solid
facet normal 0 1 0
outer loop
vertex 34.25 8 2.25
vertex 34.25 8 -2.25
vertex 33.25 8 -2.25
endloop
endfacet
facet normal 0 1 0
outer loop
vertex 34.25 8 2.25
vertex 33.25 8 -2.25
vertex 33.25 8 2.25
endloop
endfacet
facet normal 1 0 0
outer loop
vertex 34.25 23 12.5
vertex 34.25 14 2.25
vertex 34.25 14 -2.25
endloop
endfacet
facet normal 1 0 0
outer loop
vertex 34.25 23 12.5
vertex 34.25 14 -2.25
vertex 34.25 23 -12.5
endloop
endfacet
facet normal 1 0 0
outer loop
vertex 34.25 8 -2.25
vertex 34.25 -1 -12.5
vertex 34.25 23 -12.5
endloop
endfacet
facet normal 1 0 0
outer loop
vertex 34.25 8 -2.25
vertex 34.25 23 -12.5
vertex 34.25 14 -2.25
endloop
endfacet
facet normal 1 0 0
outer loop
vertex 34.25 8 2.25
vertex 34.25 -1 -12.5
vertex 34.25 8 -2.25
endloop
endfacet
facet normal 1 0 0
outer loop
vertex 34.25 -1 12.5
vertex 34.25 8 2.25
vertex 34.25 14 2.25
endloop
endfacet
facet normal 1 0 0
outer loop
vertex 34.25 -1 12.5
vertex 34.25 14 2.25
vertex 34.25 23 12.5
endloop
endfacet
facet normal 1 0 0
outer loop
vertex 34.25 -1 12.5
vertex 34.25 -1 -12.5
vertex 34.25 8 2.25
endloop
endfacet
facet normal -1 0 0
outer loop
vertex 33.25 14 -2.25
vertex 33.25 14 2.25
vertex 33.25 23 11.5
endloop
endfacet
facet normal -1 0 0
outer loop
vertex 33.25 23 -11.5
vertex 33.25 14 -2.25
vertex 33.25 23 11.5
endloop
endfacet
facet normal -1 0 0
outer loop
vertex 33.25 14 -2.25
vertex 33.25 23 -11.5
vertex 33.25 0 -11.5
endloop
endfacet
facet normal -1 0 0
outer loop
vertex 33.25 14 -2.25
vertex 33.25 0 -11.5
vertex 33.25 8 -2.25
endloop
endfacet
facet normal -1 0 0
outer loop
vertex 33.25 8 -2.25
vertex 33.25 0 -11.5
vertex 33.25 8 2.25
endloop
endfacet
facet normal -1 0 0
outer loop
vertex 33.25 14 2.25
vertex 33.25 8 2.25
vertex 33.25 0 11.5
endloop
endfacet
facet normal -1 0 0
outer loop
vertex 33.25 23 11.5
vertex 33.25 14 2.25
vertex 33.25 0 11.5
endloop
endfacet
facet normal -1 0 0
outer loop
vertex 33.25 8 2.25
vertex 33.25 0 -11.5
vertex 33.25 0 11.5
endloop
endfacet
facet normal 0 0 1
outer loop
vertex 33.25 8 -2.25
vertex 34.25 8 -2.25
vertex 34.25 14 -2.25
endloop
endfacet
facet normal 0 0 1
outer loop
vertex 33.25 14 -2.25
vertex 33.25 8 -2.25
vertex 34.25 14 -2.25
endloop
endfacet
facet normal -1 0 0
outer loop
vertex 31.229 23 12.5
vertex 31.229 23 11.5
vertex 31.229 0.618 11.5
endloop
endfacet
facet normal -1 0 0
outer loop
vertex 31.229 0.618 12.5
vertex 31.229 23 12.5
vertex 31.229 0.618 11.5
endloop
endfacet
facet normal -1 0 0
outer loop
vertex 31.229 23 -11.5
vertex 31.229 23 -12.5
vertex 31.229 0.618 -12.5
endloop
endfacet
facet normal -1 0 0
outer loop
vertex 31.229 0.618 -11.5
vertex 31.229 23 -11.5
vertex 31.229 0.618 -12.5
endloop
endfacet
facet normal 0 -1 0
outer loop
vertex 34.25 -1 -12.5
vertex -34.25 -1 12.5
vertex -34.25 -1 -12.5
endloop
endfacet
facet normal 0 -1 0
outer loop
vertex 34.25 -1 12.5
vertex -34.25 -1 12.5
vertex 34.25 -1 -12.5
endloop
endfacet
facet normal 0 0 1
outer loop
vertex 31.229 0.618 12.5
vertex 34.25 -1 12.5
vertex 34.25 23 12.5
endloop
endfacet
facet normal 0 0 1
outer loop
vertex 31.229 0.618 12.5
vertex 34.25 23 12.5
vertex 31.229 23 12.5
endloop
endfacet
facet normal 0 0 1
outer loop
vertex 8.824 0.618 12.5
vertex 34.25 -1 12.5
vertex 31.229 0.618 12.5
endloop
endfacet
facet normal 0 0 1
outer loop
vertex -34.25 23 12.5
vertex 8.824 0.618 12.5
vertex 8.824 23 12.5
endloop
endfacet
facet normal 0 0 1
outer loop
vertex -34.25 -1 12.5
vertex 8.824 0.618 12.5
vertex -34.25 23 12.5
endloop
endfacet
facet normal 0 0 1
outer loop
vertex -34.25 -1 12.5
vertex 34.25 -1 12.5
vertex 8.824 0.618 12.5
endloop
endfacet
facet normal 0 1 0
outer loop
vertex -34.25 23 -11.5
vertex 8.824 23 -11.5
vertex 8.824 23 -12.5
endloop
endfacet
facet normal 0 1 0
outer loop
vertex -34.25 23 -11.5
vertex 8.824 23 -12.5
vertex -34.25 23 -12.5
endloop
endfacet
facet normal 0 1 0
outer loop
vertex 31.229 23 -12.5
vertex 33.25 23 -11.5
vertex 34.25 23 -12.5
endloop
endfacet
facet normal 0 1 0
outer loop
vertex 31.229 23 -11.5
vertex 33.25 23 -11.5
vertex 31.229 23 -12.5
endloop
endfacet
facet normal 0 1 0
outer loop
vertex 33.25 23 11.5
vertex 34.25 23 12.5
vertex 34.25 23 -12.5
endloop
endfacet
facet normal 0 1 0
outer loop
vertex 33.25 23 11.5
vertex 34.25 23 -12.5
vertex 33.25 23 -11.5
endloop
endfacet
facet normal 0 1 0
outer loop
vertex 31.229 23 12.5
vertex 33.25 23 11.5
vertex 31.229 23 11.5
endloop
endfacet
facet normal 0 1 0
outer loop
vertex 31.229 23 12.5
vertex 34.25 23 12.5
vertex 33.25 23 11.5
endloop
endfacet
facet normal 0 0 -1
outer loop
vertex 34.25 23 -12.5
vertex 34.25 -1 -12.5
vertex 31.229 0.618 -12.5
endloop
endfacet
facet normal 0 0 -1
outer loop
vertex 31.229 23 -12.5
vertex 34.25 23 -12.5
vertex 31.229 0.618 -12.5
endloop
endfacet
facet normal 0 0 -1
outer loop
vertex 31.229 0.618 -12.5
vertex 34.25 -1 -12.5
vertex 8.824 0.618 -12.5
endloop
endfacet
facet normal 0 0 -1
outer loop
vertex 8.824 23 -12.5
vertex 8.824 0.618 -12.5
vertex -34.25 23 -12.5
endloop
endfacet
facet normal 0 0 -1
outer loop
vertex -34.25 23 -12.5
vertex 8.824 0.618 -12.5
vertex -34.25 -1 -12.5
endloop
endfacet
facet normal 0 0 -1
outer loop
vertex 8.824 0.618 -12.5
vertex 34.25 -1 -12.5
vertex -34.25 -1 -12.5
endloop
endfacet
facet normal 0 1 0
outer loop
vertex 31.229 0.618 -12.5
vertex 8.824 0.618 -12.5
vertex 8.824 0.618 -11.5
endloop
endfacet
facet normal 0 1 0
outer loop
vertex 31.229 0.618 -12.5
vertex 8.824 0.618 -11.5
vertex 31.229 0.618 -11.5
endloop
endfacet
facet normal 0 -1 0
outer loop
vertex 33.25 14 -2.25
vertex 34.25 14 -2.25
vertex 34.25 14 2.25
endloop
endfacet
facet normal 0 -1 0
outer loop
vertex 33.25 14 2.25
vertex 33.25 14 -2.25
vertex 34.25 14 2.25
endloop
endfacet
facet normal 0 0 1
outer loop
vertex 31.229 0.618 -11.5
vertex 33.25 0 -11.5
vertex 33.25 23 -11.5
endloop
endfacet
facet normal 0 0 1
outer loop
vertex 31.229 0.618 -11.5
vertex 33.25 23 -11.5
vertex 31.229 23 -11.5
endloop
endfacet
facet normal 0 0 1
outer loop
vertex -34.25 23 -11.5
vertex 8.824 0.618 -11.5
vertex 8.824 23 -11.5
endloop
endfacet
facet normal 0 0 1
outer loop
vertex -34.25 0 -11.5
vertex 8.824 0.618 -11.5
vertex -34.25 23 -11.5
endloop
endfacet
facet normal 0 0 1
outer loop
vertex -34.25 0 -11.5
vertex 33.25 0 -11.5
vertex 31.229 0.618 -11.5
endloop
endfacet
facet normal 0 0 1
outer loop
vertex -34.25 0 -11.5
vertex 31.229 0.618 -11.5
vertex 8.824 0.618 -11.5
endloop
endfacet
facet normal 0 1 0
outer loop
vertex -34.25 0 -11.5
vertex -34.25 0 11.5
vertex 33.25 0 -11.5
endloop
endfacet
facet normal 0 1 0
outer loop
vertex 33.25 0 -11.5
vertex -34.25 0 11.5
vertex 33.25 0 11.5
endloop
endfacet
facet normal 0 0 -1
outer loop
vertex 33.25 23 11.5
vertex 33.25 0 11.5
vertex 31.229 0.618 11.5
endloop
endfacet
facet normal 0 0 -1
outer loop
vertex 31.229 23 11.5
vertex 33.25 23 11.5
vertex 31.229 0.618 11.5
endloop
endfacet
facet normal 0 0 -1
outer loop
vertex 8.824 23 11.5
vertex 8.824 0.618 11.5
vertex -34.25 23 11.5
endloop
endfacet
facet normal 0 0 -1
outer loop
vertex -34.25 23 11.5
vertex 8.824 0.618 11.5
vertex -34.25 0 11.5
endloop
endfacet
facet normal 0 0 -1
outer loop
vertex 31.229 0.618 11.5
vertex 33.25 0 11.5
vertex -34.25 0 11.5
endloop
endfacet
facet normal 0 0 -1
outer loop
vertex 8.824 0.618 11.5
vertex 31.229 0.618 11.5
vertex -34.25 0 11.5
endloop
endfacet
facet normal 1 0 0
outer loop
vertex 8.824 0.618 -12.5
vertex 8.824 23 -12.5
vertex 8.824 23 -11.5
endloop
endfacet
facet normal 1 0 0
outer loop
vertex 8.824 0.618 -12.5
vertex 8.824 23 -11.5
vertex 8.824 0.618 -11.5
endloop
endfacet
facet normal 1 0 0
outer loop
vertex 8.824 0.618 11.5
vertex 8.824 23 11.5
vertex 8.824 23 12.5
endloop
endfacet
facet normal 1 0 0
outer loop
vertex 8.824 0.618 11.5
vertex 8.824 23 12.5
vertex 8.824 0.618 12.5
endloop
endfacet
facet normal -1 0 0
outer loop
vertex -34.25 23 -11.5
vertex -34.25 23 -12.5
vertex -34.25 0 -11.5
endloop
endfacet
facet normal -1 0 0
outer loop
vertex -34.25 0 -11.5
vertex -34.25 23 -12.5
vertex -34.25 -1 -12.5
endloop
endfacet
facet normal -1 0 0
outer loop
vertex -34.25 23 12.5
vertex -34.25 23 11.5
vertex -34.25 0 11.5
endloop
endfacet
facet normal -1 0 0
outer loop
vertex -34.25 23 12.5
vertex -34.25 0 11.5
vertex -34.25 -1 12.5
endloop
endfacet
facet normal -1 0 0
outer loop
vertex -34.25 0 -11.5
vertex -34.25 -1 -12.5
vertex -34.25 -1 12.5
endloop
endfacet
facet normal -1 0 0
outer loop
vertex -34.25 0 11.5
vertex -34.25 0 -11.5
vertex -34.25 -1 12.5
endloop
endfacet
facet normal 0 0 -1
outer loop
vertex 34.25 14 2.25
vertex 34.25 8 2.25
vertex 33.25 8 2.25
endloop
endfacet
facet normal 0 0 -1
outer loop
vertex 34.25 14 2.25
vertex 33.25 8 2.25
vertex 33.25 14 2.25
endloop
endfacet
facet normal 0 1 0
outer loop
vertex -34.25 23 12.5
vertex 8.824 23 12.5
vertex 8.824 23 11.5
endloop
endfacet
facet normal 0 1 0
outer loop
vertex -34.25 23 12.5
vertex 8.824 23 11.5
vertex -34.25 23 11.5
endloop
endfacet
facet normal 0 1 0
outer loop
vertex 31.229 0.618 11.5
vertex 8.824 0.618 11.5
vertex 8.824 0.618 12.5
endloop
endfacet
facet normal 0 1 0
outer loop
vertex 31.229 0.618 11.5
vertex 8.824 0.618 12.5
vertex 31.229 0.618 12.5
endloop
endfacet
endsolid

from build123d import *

# Parameters (mm, degrees)
F0_W      = 68.5
F0_H      = 25
F1_DEPTH  = 1
F2_W      = 68.5
F2_H      = 1
F3_DEPTH  = 23
F4_W      = 1
F4_H      = 24
F5_DEPTH  = 23
F6_W      = 67.5
F6_H      = 1
F7_DEPTH  = 23
F8_W      = 6
F8_H      = 4.5
F9_DEPTH  = 1
F10_W     = 22.405751
F10_H     = 22.382014
F11_DEPTH = 25


with BuildPart() as f1:
    # F0 (on Front) → F1 (new body)
    with BuildSketch(Plane.XZ):
        Rectangle(F0_W, F0_H)
    extrude(amount=F1_DEPTH)

    # F2 (on face) → F3 (join)
    with BuildSketch(Plane(origin=(0, 0, 0), x_dir=(-1, 0, 0), z_dir=(0, 1, 0))):
        with Locations((0, -12)):
            Rectangle(F2_W, F2_H)
    extrude(amount=F3_DEPTH)

    # F4 (on face) → F5 (join)
    with BuildSketch(Plane(origin=(0, 0, 0), x_dir=(-1, 0, 0), z_dir=(0, 1, 0))):
        with Locations((-33.75, 0.5)):
            Rectangle(F4_W, F4_H)
    extrude(amount=F5_DEPTH)

    # F6 (on face) → F7 (join)
    with BuildSketch(Plane(origin=(0, 0, 0), x_dir=(-1, 0, 0), z_dir=(0, 1, 0))):
        with Locations((0.5, 12)):
            Rectangle(F6_W, F6_H)
    extrude(amount=F7_DEPTH)

    # F8 (on face) → F9 (cut, through all)
    with BuildSketch(Plane.YZ.offset(34.25)):
        with Locations((11, 0)):
            Rectangle(F8_W, F8_H)
    extrude(amount=-F9_DEPTH, mode=Mode.SUBTRACT)

    # F10 (on face) → F11 (cut)
    with BuildSketch(Plane(origin=(0, 0, -12.5), x_dir=(1, 0, 0), z_dir=(0, 0, -1))):
        with Locations((20.026559, -11.808993)):
            Rectangle(F10_W, F10_H)
    extrude(amount=-F11_DEPTH, mode=Mode.SUBTRACT)


solid = f1.part
